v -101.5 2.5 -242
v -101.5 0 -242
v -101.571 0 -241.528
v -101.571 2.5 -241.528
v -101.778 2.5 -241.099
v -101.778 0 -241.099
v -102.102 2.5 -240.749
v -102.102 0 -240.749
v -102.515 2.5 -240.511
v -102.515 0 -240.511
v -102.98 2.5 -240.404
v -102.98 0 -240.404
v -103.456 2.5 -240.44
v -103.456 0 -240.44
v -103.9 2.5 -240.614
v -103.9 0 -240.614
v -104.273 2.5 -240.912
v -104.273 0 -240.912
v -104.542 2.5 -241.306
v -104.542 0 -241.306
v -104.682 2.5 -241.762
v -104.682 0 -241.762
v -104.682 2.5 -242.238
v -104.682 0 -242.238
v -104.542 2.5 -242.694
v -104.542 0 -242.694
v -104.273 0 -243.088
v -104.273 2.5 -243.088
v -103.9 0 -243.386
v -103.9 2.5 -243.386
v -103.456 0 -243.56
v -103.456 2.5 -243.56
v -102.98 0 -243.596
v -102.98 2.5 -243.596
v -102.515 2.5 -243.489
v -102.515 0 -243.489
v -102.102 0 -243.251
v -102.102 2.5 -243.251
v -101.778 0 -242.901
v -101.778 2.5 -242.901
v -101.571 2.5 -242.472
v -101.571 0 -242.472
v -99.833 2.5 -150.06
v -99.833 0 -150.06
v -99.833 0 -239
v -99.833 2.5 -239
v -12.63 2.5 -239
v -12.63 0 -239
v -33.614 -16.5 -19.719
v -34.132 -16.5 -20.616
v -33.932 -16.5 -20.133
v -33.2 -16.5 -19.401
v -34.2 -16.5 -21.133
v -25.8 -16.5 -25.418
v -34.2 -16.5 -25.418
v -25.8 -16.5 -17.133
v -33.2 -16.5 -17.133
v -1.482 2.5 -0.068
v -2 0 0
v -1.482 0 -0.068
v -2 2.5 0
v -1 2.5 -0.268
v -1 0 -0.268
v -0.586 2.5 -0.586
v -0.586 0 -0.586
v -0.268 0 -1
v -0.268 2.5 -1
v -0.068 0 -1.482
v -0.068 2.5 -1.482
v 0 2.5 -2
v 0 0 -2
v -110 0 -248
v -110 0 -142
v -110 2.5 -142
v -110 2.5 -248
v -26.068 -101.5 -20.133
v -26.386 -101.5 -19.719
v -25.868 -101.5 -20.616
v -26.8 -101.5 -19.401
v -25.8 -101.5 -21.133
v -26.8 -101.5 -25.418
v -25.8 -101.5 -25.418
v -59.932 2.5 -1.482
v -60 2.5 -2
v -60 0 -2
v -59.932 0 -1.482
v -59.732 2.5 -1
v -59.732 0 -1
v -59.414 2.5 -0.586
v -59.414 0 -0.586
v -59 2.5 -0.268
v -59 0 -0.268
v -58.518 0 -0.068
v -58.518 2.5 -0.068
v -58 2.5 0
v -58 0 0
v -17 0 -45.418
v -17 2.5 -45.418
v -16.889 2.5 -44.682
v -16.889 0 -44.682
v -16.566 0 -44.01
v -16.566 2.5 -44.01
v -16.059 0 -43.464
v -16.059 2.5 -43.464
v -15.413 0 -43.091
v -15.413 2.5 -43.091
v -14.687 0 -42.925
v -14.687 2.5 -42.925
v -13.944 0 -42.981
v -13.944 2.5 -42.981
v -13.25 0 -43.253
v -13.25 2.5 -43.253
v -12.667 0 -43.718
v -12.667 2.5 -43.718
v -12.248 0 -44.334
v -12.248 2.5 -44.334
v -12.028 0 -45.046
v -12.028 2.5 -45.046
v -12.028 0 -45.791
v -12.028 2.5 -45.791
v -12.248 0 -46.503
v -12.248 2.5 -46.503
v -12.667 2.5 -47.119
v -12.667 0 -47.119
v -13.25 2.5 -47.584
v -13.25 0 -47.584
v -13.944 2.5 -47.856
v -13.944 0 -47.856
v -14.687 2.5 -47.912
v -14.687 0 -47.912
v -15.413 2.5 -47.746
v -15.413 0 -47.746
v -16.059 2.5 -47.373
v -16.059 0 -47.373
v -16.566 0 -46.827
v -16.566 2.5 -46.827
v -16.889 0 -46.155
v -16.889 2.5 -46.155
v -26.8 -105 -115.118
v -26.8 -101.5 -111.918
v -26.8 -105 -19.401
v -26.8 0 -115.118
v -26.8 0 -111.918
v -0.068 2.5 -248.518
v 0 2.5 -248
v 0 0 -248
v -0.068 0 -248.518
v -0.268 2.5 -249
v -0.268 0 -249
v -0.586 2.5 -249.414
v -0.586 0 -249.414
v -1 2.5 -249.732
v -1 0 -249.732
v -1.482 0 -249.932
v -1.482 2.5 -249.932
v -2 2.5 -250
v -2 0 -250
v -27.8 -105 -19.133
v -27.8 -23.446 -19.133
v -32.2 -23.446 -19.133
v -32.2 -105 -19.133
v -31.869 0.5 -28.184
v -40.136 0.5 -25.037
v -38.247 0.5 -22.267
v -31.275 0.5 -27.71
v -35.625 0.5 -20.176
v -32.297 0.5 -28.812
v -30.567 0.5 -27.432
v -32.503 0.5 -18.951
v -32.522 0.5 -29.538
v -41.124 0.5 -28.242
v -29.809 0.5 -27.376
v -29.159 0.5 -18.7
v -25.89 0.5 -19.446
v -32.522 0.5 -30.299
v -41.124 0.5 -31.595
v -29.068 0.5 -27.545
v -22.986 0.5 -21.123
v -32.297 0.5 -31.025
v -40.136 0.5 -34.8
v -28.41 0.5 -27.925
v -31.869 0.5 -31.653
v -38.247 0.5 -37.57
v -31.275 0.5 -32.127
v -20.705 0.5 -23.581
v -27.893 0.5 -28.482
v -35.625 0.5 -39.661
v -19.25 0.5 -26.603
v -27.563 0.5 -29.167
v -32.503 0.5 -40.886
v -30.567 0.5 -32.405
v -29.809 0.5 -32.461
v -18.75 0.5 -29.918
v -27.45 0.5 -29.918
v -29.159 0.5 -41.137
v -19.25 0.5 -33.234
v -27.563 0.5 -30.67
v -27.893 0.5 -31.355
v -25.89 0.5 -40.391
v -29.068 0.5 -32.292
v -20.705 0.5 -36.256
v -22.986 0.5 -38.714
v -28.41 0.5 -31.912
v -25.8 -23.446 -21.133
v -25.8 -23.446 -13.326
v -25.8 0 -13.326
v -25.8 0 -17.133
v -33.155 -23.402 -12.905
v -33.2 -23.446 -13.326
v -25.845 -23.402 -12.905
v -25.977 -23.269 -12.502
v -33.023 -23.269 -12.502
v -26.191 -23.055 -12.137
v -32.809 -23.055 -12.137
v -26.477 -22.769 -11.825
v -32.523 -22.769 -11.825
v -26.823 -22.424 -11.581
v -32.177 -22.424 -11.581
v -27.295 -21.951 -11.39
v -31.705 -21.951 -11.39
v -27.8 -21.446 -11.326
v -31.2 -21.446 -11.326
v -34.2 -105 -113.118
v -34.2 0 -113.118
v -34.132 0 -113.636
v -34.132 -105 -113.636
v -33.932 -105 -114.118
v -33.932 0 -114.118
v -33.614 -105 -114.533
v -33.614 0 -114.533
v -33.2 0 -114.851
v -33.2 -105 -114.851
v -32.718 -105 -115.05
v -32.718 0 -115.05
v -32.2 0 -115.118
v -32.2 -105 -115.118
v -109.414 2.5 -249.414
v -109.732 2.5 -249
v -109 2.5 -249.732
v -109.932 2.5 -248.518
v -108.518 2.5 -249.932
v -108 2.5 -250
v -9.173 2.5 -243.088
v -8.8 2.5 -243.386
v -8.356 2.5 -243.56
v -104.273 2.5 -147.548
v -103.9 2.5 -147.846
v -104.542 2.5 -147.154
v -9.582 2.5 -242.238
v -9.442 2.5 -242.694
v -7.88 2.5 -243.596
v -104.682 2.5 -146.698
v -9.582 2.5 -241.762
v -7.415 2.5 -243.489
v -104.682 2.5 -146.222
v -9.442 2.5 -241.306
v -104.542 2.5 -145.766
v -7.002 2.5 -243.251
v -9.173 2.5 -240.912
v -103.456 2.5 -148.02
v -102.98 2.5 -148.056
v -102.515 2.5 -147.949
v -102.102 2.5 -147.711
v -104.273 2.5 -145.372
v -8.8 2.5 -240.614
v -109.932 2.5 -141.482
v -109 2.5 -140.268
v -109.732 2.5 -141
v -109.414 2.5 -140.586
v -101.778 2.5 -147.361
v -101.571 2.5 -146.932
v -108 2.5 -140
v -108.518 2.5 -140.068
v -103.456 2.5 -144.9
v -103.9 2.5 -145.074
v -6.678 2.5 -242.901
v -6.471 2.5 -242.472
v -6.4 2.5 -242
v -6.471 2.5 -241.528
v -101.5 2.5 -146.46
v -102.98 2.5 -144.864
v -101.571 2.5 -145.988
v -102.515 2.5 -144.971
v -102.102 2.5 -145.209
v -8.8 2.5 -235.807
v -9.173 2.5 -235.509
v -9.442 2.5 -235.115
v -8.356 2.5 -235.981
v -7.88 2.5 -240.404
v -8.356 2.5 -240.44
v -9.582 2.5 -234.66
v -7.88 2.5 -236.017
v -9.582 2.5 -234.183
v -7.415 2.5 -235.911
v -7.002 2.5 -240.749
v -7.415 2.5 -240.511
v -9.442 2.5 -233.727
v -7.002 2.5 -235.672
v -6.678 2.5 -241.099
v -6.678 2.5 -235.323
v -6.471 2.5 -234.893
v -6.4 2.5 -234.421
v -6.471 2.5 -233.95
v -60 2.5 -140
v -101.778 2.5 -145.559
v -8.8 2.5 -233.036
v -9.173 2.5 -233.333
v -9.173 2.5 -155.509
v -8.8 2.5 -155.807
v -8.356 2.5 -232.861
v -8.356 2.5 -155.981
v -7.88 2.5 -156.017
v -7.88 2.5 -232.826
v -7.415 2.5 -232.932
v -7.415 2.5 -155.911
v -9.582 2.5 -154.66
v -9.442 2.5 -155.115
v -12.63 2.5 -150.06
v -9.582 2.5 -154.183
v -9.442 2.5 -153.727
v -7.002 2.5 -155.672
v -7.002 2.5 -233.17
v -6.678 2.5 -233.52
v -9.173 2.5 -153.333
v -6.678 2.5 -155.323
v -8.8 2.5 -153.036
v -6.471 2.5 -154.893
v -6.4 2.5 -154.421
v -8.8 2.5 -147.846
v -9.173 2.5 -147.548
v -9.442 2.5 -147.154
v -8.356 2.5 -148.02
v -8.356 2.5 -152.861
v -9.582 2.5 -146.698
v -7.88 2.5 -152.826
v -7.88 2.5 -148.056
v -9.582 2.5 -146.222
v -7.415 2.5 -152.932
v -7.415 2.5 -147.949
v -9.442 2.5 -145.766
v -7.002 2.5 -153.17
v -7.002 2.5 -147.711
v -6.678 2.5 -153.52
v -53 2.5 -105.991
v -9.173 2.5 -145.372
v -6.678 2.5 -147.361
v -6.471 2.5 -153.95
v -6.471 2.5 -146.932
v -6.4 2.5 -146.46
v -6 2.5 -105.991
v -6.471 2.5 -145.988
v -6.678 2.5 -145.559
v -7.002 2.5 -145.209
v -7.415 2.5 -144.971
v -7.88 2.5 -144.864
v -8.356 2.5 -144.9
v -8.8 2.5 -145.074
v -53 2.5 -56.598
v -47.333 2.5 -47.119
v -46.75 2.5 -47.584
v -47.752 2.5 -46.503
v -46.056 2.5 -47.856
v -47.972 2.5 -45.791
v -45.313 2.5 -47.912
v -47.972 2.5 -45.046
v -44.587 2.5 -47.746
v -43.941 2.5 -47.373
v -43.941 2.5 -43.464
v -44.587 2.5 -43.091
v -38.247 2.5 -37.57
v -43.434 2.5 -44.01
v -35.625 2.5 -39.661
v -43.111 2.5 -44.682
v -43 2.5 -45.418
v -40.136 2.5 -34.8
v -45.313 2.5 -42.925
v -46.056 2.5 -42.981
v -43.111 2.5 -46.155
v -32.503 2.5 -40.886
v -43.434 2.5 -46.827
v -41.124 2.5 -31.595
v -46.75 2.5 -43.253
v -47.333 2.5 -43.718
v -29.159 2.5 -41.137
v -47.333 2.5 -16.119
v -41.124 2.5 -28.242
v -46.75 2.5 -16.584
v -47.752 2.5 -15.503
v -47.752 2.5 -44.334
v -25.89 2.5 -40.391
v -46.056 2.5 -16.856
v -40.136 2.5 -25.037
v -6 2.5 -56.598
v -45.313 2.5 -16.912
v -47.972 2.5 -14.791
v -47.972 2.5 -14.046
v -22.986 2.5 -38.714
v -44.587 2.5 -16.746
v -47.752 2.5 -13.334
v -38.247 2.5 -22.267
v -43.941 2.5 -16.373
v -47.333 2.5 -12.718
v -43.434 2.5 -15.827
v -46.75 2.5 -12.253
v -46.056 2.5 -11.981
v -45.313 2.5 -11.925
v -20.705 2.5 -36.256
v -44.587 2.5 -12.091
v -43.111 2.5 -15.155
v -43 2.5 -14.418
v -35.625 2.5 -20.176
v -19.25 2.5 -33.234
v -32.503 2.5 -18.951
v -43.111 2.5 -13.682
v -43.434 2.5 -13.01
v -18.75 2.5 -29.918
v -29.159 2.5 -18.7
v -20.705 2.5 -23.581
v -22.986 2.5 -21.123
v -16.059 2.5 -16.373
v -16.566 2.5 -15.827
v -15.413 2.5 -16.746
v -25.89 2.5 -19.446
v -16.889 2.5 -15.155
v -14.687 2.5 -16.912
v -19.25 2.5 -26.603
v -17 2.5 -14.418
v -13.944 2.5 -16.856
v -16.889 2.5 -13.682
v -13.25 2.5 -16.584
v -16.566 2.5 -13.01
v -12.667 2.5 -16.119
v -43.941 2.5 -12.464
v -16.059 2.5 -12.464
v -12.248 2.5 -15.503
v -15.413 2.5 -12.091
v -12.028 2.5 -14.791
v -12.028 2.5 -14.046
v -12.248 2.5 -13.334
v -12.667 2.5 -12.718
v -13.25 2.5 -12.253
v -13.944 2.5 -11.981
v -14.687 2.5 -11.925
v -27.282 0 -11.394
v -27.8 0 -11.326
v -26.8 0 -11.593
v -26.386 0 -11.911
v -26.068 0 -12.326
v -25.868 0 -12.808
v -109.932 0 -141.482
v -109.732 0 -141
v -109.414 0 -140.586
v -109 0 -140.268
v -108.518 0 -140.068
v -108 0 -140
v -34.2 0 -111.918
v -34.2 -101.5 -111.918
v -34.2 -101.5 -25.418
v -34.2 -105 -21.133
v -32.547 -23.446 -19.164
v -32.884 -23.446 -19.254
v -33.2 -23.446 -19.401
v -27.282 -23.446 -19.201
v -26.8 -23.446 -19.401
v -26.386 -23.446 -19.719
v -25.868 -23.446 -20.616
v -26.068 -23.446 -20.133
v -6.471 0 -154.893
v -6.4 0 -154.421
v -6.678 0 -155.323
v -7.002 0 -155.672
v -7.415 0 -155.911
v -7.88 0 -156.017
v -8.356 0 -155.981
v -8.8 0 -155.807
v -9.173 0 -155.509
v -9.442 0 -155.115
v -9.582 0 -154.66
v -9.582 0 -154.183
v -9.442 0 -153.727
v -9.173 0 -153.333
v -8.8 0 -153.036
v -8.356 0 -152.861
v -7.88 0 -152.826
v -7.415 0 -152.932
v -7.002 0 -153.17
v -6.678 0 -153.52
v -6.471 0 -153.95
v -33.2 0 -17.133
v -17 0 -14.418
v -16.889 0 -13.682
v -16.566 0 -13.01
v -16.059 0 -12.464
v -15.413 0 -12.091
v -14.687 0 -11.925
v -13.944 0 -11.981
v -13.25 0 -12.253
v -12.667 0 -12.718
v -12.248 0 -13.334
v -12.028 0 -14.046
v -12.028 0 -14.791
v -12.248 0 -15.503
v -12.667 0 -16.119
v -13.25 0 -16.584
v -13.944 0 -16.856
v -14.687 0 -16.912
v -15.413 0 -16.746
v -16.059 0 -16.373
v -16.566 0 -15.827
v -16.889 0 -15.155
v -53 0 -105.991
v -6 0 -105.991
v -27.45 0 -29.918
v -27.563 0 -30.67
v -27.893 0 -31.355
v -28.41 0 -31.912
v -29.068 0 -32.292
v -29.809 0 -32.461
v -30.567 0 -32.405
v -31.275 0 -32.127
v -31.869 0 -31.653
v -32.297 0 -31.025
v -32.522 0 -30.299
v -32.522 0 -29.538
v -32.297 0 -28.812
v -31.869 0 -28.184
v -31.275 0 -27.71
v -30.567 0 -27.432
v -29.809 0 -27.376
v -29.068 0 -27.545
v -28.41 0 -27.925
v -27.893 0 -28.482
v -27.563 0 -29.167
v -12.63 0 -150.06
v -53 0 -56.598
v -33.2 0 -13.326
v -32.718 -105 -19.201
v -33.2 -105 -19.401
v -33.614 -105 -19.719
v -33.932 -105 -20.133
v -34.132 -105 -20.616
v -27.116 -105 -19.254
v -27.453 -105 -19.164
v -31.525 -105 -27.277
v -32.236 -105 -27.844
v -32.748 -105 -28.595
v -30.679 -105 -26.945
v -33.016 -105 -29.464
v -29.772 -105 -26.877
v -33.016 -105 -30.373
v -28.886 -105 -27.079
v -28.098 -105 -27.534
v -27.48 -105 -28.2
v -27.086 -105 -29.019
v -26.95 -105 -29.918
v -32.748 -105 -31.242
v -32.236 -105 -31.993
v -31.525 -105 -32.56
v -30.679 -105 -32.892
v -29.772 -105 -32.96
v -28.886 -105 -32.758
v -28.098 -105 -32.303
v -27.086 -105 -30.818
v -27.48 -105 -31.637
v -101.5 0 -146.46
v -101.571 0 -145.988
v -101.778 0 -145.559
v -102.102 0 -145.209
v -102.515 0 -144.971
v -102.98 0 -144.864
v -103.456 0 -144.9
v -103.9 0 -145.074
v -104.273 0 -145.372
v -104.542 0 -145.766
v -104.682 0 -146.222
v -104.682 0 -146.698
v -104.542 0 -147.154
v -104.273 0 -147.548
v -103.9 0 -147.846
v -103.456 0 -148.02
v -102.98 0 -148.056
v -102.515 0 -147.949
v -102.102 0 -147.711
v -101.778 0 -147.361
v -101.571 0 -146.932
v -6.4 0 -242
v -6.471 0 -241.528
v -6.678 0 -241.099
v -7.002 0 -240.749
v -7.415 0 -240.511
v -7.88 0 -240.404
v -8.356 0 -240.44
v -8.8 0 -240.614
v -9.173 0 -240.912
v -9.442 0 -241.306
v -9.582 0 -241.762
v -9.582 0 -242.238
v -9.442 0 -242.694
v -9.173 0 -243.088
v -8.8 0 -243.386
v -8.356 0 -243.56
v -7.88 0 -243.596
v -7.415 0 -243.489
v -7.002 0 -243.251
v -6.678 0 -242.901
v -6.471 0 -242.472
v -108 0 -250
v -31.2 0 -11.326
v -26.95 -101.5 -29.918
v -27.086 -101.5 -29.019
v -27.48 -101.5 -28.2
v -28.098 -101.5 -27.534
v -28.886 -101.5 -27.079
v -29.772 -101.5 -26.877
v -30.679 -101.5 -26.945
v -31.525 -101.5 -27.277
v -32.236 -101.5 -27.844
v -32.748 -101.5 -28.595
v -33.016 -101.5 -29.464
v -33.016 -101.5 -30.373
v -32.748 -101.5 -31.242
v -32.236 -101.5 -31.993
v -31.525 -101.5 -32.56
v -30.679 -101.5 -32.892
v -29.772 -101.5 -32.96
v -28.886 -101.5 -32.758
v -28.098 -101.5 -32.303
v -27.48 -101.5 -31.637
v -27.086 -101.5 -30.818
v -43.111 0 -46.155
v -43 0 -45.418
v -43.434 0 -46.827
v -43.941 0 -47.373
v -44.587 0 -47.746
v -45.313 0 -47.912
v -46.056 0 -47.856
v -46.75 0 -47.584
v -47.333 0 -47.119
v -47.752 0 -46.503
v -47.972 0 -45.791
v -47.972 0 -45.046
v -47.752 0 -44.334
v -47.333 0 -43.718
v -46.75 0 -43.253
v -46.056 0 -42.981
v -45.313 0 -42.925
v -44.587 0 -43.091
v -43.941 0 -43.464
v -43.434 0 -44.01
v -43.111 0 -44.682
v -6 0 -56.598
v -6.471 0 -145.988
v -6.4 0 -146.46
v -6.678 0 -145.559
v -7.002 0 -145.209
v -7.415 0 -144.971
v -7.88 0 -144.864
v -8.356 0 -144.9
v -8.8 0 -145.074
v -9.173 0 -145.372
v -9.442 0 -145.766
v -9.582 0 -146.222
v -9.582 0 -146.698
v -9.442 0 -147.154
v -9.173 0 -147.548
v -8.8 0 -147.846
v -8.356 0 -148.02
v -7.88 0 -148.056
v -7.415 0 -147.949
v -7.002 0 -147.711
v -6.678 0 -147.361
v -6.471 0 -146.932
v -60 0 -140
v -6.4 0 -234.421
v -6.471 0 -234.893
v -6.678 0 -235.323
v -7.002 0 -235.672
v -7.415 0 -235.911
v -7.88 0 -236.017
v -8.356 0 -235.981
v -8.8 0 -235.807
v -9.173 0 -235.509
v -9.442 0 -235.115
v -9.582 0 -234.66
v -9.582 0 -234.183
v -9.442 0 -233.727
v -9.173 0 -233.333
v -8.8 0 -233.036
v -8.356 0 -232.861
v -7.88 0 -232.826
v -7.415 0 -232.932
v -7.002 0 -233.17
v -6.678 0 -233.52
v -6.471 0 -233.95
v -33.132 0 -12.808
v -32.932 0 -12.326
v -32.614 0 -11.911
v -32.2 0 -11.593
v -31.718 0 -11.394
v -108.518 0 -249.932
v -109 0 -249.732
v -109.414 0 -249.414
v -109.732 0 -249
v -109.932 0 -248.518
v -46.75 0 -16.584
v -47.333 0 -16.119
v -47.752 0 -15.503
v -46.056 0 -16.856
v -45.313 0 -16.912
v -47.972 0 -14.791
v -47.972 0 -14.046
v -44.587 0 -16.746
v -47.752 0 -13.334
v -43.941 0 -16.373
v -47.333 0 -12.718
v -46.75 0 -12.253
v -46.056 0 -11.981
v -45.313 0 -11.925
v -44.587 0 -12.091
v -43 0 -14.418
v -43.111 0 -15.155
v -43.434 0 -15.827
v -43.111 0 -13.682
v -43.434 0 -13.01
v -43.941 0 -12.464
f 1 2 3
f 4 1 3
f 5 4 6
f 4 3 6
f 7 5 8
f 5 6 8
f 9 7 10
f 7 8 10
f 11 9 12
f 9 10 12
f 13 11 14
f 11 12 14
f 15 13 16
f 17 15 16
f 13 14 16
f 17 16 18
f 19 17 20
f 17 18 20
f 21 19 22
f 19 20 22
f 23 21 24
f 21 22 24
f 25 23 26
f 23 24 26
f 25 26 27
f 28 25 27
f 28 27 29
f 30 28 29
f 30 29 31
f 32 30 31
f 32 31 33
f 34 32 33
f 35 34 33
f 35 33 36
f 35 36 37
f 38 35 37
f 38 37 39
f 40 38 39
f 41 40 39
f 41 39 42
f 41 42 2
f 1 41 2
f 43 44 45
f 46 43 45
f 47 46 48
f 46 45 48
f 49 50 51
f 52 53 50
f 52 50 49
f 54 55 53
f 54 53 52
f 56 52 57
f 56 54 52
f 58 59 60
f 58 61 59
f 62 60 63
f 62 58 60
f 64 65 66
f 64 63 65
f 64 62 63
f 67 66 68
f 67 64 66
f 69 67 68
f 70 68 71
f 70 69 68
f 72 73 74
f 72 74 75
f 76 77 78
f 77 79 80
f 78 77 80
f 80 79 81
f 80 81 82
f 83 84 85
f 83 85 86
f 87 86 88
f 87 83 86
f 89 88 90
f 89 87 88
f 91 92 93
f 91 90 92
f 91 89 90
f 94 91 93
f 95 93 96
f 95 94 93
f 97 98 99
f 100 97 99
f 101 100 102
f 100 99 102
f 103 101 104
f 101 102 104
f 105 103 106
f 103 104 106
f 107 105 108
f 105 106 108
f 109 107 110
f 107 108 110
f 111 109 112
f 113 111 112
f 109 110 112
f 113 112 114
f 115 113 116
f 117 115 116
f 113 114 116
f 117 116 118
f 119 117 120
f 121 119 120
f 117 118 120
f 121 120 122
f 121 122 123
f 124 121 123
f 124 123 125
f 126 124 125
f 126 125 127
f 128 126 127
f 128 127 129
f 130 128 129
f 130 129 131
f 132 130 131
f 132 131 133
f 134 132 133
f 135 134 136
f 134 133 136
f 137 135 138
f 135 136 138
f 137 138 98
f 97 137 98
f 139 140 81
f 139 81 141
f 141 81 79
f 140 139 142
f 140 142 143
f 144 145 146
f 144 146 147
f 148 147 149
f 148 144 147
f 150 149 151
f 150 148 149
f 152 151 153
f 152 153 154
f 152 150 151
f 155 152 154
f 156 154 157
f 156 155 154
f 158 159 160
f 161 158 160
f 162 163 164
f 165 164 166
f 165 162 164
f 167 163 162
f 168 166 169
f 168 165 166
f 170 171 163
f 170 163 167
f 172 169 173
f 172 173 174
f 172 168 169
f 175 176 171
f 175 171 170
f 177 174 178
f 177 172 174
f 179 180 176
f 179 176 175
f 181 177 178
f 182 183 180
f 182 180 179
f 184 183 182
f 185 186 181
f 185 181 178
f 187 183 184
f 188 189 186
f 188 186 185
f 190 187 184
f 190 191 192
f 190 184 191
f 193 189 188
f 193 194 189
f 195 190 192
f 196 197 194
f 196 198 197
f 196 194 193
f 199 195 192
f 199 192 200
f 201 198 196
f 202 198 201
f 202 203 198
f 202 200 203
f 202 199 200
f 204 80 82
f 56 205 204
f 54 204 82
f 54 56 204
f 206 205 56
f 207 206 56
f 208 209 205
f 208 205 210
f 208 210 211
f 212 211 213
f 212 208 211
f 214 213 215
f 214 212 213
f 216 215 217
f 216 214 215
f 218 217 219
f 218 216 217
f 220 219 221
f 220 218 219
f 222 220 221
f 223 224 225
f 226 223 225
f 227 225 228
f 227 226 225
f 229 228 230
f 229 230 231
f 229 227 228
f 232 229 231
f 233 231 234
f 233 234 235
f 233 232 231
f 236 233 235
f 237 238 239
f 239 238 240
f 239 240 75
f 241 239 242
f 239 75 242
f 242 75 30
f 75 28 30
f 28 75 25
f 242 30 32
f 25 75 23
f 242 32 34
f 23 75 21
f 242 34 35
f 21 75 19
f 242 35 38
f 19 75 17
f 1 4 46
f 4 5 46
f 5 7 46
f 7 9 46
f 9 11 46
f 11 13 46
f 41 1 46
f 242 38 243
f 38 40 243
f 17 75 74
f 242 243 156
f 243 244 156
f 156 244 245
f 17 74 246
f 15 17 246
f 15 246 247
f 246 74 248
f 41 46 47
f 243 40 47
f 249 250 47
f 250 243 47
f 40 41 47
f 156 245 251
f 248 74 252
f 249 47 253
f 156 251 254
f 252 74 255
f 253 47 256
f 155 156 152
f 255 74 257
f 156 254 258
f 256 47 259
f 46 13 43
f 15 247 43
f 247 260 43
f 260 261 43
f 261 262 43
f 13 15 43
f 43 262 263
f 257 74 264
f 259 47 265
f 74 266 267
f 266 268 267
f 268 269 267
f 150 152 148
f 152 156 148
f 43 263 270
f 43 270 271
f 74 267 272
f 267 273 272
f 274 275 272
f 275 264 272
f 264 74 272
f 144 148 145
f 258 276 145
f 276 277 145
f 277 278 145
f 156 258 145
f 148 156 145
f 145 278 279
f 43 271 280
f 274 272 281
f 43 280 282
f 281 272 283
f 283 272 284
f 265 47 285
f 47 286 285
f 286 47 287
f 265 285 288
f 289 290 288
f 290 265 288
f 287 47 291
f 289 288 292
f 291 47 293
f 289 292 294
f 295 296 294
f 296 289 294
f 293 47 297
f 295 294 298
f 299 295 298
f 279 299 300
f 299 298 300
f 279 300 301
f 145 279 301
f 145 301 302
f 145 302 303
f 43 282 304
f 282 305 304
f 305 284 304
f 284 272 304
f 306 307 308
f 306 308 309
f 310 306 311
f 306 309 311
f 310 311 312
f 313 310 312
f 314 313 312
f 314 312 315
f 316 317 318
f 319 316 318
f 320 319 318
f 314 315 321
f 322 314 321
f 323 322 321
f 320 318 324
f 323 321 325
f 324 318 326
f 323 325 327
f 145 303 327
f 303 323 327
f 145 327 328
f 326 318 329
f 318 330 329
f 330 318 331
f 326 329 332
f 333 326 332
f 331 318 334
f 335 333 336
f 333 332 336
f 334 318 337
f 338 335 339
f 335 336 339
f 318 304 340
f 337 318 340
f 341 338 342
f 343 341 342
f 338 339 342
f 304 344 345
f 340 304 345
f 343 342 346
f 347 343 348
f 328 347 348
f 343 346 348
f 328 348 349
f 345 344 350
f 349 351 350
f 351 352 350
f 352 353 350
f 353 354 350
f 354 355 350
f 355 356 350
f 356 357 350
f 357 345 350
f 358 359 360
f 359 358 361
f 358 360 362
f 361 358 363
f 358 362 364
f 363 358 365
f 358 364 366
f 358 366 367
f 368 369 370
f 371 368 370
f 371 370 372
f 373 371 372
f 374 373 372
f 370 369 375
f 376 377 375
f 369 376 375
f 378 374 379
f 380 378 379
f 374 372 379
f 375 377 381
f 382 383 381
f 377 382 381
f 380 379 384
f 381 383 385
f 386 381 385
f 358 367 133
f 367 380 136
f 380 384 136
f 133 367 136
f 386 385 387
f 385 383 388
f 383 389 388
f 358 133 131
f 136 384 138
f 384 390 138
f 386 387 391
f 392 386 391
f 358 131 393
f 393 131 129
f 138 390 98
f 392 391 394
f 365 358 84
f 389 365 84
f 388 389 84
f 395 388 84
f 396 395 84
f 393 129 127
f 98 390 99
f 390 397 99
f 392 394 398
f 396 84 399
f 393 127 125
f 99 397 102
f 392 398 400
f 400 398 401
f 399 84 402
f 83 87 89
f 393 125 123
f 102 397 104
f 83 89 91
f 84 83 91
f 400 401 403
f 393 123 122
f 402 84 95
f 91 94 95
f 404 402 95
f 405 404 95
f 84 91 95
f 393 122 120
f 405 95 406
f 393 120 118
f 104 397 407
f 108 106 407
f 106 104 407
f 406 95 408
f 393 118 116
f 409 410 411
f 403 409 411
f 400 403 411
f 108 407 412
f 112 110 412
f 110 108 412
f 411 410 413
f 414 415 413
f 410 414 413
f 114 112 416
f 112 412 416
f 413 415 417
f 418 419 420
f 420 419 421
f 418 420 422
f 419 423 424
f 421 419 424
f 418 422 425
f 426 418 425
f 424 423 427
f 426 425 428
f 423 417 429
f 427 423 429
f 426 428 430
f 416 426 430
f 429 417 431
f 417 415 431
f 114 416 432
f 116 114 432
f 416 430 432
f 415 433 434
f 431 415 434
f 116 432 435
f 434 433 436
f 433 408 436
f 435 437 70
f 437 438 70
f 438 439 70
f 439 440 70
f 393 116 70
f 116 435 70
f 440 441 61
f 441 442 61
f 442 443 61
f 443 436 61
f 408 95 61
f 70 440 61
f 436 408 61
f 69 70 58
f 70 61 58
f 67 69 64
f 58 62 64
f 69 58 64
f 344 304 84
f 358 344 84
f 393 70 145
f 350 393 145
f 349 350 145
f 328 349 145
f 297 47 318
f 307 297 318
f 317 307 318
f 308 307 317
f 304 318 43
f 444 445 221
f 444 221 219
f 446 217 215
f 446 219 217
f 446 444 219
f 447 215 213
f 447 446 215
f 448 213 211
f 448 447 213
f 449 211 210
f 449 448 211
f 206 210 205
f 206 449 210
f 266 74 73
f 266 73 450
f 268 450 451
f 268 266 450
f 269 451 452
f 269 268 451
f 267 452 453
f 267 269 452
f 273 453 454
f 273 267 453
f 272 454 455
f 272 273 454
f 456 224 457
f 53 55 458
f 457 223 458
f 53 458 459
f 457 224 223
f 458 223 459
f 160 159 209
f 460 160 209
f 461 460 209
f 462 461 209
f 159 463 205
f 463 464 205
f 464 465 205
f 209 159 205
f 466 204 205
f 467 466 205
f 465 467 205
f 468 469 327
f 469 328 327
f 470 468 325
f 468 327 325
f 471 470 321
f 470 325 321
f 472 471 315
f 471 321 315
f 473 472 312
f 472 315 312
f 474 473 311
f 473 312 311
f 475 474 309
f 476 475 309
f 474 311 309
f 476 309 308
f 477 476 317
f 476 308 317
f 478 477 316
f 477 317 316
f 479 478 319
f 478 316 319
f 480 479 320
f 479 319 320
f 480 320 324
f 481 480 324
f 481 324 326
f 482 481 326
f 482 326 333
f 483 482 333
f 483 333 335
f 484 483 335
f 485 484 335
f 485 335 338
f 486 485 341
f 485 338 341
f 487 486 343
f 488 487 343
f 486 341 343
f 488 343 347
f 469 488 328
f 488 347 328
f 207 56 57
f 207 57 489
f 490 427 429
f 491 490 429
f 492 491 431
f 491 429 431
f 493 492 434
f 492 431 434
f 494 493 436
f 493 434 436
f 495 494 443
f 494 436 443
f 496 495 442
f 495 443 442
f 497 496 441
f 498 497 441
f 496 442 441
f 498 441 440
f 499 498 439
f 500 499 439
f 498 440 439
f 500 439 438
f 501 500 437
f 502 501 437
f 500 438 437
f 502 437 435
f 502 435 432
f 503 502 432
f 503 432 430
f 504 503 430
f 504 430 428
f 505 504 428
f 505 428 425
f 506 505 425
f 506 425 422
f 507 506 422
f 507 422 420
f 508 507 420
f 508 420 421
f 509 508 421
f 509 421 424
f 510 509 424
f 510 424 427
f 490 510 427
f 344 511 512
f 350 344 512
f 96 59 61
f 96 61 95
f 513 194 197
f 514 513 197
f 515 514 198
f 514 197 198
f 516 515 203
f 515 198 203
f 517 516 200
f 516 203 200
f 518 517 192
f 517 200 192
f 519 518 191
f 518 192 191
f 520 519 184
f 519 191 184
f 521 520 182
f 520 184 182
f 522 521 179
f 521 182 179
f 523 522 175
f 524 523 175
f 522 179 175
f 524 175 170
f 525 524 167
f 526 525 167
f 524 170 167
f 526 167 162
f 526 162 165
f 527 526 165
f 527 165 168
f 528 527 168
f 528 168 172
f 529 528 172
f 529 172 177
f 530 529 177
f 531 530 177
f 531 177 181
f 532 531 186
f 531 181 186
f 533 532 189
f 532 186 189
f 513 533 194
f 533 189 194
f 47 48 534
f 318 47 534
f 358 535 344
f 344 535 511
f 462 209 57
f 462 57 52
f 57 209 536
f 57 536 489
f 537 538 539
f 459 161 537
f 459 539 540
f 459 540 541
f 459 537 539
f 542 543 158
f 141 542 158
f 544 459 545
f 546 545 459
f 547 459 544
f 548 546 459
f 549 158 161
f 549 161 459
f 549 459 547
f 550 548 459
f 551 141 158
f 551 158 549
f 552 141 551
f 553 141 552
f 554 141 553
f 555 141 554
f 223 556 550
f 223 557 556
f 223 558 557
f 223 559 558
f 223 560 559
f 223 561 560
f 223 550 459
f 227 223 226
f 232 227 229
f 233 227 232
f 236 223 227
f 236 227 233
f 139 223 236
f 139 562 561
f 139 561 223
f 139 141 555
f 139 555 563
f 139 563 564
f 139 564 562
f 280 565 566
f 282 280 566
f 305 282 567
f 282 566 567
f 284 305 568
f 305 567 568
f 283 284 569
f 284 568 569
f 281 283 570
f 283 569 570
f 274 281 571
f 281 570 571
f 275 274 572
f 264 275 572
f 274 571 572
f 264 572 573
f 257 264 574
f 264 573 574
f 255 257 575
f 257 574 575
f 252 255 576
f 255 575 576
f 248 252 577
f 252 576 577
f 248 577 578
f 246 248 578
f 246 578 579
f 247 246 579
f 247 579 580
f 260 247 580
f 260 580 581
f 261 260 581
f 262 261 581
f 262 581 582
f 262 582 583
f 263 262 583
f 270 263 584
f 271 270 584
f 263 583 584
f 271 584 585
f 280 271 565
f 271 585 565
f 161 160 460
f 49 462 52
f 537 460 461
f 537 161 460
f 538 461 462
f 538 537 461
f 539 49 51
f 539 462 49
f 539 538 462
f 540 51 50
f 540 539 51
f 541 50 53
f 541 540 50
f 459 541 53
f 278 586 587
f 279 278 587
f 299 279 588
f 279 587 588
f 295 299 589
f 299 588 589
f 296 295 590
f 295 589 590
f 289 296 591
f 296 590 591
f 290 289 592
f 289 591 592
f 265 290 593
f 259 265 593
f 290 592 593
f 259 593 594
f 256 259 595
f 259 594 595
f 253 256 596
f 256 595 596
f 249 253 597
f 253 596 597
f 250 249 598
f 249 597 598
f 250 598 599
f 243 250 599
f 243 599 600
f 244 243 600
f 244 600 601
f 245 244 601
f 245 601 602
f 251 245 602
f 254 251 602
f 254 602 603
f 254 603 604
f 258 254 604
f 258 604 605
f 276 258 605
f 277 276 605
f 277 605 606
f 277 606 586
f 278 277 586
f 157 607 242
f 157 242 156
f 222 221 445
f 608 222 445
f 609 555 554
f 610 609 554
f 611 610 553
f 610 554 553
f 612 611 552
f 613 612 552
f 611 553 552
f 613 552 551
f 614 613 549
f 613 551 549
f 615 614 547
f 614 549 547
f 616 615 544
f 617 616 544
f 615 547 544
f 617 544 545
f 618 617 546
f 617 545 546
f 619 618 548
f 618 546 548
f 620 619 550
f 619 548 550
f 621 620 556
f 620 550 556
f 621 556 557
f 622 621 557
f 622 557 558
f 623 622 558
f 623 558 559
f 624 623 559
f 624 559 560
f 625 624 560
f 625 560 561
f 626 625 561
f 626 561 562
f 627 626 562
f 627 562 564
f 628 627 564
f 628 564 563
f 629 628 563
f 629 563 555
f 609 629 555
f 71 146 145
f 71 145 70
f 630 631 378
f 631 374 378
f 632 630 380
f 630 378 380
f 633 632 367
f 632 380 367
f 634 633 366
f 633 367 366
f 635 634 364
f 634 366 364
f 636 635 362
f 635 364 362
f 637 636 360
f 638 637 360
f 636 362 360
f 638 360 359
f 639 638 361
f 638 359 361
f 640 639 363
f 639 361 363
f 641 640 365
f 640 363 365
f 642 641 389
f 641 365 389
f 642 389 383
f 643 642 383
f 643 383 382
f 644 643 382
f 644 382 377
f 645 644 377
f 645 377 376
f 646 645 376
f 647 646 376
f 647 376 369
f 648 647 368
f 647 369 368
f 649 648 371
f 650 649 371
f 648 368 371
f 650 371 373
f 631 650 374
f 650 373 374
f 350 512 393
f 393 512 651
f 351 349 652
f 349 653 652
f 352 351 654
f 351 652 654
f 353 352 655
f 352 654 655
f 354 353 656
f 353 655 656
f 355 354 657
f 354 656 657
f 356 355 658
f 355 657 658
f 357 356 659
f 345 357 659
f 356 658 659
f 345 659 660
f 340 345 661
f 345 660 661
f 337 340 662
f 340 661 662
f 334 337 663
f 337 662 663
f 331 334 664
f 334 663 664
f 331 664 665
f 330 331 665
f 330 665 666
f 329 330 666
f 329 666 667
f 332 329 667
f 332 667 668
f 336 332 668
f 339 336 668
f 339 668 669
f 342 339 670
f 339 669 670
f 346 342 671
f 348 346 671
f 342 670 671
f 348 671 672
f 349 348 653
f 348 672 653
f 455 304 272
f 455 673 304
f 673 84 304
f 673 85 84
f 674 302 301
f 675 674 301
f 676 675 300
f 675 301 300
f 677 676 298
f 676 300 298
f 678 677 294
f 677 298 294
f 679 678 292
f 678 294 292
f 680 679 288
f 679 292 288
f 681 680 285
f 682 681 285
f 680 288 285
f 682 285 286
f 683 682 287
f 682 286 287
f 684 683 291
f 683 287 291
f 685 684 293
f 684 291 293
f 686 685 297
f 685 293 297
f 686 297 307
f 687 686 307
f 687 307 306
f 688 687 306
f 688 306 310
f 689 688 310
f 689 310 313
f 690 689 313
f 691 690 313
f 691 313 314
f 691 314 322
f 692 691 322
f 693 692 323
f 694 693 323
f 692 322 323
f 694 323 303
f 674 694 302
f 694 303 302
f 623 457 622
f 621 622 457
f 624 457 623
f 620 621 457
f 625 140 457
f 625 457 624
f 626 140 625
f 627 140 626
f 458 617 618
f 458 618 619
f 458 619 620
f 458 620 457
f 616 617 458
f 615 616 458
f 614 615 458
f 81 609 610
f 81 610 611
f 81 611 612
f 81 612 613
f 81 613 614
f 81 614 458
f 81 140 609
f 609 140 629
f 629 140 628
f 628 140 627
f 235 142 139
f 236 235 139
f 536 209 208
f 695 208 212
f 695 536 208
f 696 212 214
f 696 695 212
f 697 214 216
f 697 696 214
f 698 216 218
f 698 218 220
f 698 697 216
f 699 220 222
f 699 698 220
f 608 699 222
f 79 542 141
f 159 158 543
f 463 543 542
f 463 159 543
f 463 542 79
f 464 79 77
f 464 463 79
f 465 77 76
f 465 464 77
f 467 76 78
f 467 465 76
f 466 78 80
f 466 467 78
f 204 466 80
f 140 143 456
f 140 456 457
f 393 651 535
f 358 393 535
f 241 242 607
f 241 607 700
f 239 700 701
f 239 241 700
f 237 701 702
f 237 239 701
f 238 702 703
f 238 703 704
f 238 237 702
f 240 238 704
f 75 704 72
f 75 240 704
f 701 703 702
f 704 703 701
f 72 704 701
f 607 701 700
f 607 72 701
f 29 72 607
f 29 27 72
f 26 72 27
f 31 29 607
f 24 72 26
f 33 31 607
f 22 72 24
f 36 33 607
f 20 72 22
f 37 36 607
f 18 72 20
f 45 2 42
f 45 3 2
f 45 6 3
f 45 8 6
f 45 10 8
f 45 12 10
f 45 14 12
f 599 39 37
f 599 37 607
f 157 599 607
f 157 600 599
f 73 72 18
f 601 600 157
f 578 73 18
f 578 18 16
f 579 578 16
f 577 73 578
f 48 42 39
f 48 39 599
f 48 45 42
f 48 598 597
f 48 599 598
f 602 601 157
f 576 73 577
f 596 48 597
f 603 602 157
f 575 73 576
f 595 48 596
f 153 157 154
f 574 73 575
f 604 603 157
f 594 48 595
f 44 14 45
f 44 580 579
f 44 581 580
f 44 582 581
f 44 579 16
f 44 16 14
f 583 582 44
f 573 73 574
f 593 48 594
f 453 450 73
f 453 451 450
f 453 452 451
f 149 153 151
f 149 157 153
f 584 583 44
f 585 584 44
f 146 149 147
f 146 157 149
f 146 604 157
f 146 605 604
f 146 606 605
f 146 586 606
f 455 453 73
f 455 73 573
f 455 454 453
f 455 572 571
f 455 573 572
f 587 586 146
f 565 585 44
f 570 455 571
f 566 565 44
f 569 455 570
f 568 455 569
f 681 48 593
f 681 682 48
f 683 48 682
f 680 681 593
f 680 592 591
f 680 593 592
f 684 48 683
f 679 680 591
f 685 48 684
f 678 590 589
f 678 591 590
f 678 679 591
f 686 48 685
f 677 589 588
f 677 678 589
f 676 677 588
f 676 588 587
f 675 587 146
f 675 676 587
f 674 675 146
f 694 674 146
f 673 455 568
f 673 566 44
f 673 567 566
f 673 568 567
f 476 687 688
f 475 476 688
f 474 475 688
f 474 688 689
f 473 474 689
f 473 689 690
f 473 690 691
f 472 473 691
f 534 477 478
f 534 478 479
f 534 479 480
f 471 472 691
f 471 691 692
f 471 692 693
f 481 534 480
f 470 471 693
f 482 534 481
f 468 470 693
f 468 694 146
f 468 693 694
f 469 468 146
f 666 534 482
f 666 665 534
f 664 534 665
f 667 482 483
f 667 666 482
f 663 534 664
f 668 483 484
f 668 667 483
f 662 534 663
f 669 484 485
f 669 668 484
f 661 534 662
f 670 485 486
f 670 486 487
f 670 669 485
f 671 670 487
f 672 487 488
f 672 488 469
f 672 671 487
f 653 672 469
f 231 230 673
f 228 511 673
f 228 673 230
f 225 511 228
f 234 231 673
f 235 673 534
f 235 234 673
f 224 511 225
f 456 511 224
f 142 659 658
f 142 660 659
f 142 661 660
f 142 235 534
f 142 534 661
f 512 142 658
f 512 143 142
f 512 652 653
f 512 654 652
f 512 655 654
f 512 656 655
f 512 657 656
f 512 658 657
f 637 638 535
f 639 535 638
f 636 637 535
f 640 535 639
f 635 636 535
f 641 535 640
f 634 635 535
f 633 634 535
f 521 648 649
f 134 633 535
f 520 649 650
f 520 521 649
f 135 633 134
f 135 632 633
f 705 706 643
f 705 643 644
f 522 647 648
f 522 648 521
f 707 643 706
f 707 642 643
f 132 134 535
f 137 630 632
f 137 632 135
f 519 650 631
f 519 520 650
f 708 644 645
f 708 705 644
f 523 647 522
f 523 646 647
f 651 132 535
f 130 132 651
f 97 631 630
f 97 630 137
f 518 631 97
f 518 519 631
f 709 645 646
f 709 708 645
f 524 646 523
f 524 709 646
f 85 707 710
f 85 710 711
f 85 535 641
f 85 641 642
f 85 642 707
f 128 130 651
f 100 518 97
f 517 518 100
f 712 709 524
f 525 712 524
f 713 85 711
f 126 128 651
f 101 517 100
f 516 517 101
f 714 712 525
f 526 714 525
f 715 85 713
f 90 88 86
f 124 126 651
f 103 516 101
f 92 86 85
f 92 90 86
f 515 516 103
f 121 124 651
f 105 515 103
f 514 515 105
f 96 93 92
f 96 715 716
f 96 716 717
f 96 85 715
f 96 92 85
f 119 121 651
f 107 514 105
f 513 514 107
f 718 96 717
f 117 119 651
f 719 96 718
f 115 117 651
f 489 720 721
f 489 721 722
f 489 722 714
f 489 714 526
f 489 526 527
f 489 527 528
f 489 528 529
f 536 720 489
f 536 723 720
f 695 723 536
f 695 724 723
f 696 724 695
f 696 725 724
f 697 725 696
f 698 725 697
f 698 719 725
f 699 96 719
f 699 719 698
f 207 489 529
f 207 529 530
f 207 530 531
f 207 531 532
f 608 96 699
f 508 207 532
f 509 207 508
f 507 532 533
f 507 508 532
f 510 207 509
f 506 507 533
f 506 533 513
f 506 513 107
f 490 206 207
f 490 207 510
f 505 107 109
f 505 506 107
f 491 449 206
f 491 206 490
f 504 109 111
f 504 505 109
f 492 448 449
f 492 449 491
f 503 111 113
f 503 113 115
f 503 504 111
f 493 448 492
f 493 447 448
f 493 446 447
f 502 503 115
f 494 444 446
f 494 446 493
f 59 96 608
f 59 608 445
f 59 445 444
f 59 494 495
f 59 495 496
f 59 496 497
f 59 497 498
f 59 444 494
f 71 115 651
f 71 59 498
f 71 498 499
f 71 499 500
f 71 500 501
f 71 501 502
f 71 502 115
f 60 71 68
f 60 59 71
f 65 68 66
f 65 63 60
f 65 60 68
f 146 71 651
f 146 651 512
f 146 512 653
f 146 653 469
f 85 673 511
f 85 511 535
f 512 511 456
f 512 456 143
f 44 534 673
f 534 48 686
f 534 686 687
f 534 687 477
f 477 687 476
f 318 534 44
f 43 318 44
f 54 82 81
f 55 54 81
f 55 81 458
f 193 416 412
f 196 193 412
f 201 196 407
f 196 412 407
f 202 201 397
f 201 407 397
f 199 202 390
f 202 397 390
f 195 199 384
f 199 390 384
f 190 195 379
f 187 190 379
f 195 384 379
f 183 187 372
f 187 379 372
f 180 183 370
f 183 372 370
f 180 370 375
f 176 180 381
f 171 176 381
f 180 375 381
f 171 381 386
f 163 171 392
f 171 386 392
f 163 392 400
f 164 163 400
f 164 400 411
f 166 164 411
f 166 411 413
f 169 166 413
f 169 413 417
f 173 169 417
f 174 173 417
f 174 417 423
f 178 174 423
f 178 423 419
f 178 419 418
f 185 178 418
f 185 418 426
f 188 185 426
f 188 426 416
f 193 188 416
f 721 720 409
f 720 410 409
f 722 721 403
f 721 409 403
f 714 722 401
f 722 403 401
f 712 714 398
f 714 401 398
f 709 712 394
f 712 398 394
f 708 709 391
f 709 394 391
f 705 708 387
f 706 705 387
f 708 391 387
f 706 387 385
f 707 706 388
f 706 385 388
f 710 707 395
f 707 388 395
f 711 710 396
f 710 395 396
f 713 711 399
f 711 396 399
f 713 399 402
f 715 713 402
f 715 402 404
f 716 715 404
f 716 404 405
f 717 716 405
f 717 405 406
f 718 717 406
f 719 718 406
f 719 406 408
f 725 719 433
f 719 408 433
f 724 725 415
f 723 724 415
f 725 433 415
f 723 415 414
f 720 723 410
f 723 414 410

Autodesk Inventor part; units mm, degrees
ref_plane "YZ Plane" through (0, 0, 0) normal (1, 0, 0) x (0, 1, 0)
ref_plane "XZ Plane" through (0, 0, 0) normal (0, 1, 0) x (-1, 0, 0)
ref_plane "XY Plane" through (0, 0, 0) normal (0, 0, 1) x (1, 0, 0)
sketch "草图1" plane through (0, 0, 0) normal (0, 1, 0) x (-1, 0, 0)
  line L0 (0, 0) -> (60, 0)
  line L1 (60, 0) -> (60, -140)
  line L2 (60, -140) -> (0, -140)
  line L3 (0, -140) -> (0, 0)
  dimension "d0" = 60
  dimension "d1" = 140
extrude "拉伸1" add sketch "草图1" along normal blind 2.5
sketch "草图2" plane through (0, 2.5, 0) normal (0, 1, 0) x (1, 0, 0)
  line L0 (0, 140) -> (-60, 140) projected
  line L1 (-60, 140) -> (-60, 0) projected
  line L2 (-60, 0) -> (0, 0) projected
  line L3 (0, 0) -> (0, 140) projected
  line L4 (-60, 0) -> (0, 0) projected
  line L5 (-30, 0) -> (-30, 146.6003)
  line L6 (-30, 8.9185) -> (-51, 8.9185)
  line L7 (-51, 8.9185) -> (-51, 50.9185)
  line L8 (-51, 50.9185) -> (-30, 50.9185)
  line L9 (-30, 50.9185) -> (-30, 8.9185)
  line L10 (-30, 8.9185) -> (-9, 8.9185)
  line L11 (-9, 8.9185) -> (-9, 50.9185)
  line L12 (-9, 50.9185) -> (-30, 50.9185)
  circle A0 centre (-45.5, 14.4185) radius 2.9433
  line L13 (-51, 29.9185) -> (-35.5931, 29.9185)
  circle A1 centre (-45.5, 45.4185) radius 2.9433
  circle A2 centre (-14.5, 14.4185) radius 2.9433
  circle A3 centre (-14.5, 45.4185) radius 2.9433
  circle A4 centre (-30, 29.9185) radius 2.55
  circle A5 centre (-30, 29.9185) radius 11.25
  dimension "d4" = 21
  dimension "d5" = 42
  dimension "d6" = 31
  dimension "d7" = 31
  dimension "d12" = 5.1
  dimension "d15" = 22.5
extrude "拉伸4" cut sketch "草图2" along normal mid plane 10 contours A4 L5 | L5 A4
extrude "拉伸5" cut sketch "草图2" against normal blind 10 contours A5 L5 A4 | L5 A4 A5 | A4 L5 | L5 A4
extrude "拉伸6" cut sketch "草图2" against normal blind 10 contours A5 L5 A4 | L5 A4 A5 | A4 L5 | L5 A4
sketch "草图6" plane through (0, 0, 0) normal (0, -1, 0) x (1, 0, 0)
  line L0 (-9, -8.9185) -> (-51, -8.9185) projected
  circle A0 centre (-30, -29.9185) radius 2.55 projected
  line L1 (-30, -29.9185) -> (-26.8, -29.9185)
  line L2 (-26.8, -29.9185) -> (-26.8, -111.9185)
  line L3 (-30, -29.9185) -> (-30, -39.9264)
  line L4 (-30, -29.9185) -> (-33.2, -29.9185)
  line L5 (-33.2, -29.9185) -> (-33.2, -111.9185)
  line L6 (-26.8, -111.9185) -> (-31.6, -111.9185)
  line L7 (-31.6, -111.9185) -> (-33.2, -111.9185)
  line L8 (-26.8, -111.9185) -> (-33.2, -111.9185)
  line L9 (-33.2, -111.9185) -> (-33.2, -115.1185)
  line L10 (-33.2, -115.1185) -> (-26.8, -115.1185)
  line L11 (-26.8, -115.1185) -> (-26.8, -111.9185)
  point P0 (0, 0)
  dimension "d20" = 3.2
  dimension "d21" = 82
  dimension "d22" = 3.2
extrude "拉伸7" add sketch "草图6" along normal blind 105 contours L11 L10 L9 L7 L6
sketch "草图7" plane through (-33.2, 0, -111.9185) normal (0, 0, 1) x (1, 0, 0)
  line L0 (0, 0) -> (6.4, 0) projected
  line L1 (0, 0) -> (0, -105) projected
  line L2 (6.4, -105) -> (0, -105) projected
  line L3 (6.4, 0) -> (6.4, -105) projected
  line L4 (6.4, 0) -> (6.4, -105) projected
  line L5 (0, 0) -> (0, -105) projected
  line L6 (6.4, -105) -> (0, -105)
  line L7 (0, -105) -> (0, -101.5)
  line L8 (0, -101.5) -> (6.4, -101.5)
  line L9 (6.4, -101.5) -> (6.4, -105)
  point P0 (33.2, 0)
  dimension "d25" = 3.5
sketch "草图8" plane through (0, -105, 0) normal (0, -1, 0) x (1, 0, 0)
  line L0 (-26.8, -111.9185) -> (-26.8, -115.1185) projected
  line L1 (-26.8, -115.1185) -> (-33.2, -115.1185) projected
  line L2 (-33.2, -115.1185) -> (-33.2, -111.9185) projected
  line L3 (-33.2, -111.9185) -> (-26.8, -111.9185) projected
  circle A0 centre (-30, -29.9185) radius 11.25 projected
  line L4 (0, -140) -> (-60, -140) projected
  line L5 (0, 0) -> (0, -140) projected
  line L6 (-60, 0) -> (0, 0) projected
  line L7 (-60, -140) -> (-60, 0) projected
  line L8 (-26.8, -111.9185) -> (-26.8, -29.9185)
  line L9 (-26.8, -29.9185) -> (-33.2, -29.9185)
  line L10 (-33.2, -29.9185) -> (-33.2, -111.9185)
  line L11 (-33.2, -111.9185) -> (-26.8, -111.9185)
  line L12 (-26.8, -111.9185) -> (-26.8, -29.9185)
  circle A1 centre (-30, -29.9185) radius 3.2
  line L13 (-26.8, -29.9185) -> (-26.8, -14.9185)
  line L14 (-26.8, -14.9185) -> (-33.2, -14.9185)
  line L15 (-33.2, -14.9185) -> (-33.2, -29.9185)
  circle A2 centre (-30, -29.9185) radius 2.55 projected
  line L16 (-26.8, -14.9185) -> (-26.8, -25.4185)
  line L17 (-26.8, -25.4185) -> (-33.2, -25.4185)
  dimension "d26" = 15
  dimension "d40" = 10.5
extrude "拉伸8" add sketch "草图8" against normal blind 3.5 contours L3 L10 A0 L8 | A0 L10 A1 L8 | A1 L9 A2 | L9 A2 A1 | A1 L15 L17 L13 | L15 L14 L13 A0 | A0 L13 L17 L15
sketch "草图10" plane through (0, -105, 0) normal (0, -1, 0) x (1, 0, 0)
  line L0 (-26.8, -111.9185) -> (-26.8, -115.1185) projected
  line L1 (-26.8, -115.1185) -> (-33.2, -115.1185) projected
  line L2 (-33.2, -115.1185) -> (-33.2, -111.9185) projected
  line L3 (-33.2, -111.9185) -> (-26.8, -111.9185) projected
  circle A0 centre (-30, -29.9185) radius 11.25 projected
  line L4 (0, -140) -> (-60, -140) projected
  line L5 (0, 0) -> (0, -140) projected
  line L6 (-60, 0) -> (0, 0) projected
  line L7 (-60, -140) -> (-60, 0) projected
  circle A1 centre (-30, -29.9185) radius 2.55 projected
  line L8 (-33.2, -14.9185) -> (-33.2, -115.1185) projected
  line L9 (-33.2, -115.1185) -> (-26.8, -115.1185) projected
  line L10 (-26.8, -115.1185) -> (-26.8, -14.9185) projected
  line L11 (-26.8, -14.9185) -> (-33.2, -14.9185) projected
  circle A2 centre (-30, -29.9185) radius 3.05
  point P0 (-33.2, -19.1332)
  point P1 (-26.8, -19.1332)
  dimension "d31" = 6.1
extrude "拉伸9" add sketch "草图10" against normal up to surface (105 mm away) contours A0 L8 L11 L10
extrude "拉伸10" cut sketch "草图10" against normal up to surface (3.5 mm away) contours A2
sketch "草图11" plane through (-33.2, -105, -115.1185) normal (-1, 0, 0) x (0, 0, 1)
  line L0 (3.2, 3.5) -> (95.9853, 3.5) projected
  line L1 (3.2, 105) -> (3.2, 3.5) projected
  line L2 (0, 105) -> (3.2, 105) projected
  line L3 (0, 105) -> (0, 0) projected
  line L4 (100.2, 0) -> (0, 0) projected
  line L5 (100.2, 0) -> (100.2, 105) projected
  line L6 (95.9853, 105) -> (100.2, 105) projected
  line L7 (95.9853, 3.5) -> (95.9853, 105) projected
  point P0 (115.1185, 105)
extrude "拉伸11" add sketch "草图11" along normal blind 1
sketch "草图12" plane through (0, 0, 0) normal (0, -1, 0) x (1, 0, 0)
  point P0 (0, 0)
extrude "拉伸12" add sketch "草图2" against normal up to surface (2.5 mm away) contours A5 L5 A4 | L5 A4 A5
sketch "草图13" plane through (-30, 2.5, -29.9185) normal (0, 1, 0) x (1, 0, 0)
  point P0 (30, -29.9185)
extrude "拉伸13" cut sketch "草图2" against normal blind 2 contours A5 L5 A4 | L5 A4 A5
sketch "草图14" plane through (0, -105, 0) normal (0, -1, 0) x (1, 0, 0)
  circle A0 centre (-30, -29.9185) radius 3.05 projected
  line L0 (-26.8, -115.1185) -> (-34.2, -115.1185) projected
  line L1 (-26.8, -14.9185) -> (-34.2, -14.9185) projected
  line L2 (-34.2, -115.1185) -> (-34.2, -14.9185) projected
  line L3 (-34.2, -115.1185) -> (-34.2, -14.9185) projected
  line L4 (-34.2, -19.1332) -> (-34.2, -14.9185) projected
  line L5 (-34.2, -19.1332) -> (-34.2, -111.9185) projected
  line L6 (-34.2, -115.1185) -> (-34.2, -111.9185) projected
  line L7 (-33.2, -19.1332) -> (-34.2, -19.1332) projected
  line L8 (-34.2, -19.1332) -> (-25.8, -19.1332)
  line L9 (-25.8, -115.1185) -> (-25.8, -14.9185) projected
  line L10 (-26.8, -115.1185) -> (-26.8, -14.9185) projected
  point P0 (0, 0)
  point P1 (-26.8, -19.1332)
extrude "拉伸14" cut sketch "草图14" against normal up to surface (105 mm away) contours L8 L7 L2 L1 L10
sketch "草图15" plane through (0, -101.5, 0) normal (0, 1, 0) x (1, 0, 0)
  line L0 (-34.2, 111.9185) -> (-26.8, 111.9185) projected
  line L1 (-34.2, 19.1332) -> (-34.2, 111.9185) projected
  circle A0 centre (-30, 29.9185) radius 3.05 projected
  line L2 (-26.8, 25.4185) -> (-33.2, 25.4185) projected
  line L3 (-26.8, 14.9185) -> (-26.8, 25.4185) projected
  line L4 (-34.2, 19.1332) -> (-26.8, 19.1332) projected
  line L5 (-26.8, 19.1332) -> (-26.8, 111.9185) projected
  point P0 (0, 0)
sketch "草图16" plane through (0, -105, 0) normal (0, -1, 0) x (1, 0, 0)
  line L0 (-26.8, -25.4185) -> (-33.2, -25.4185) projected
  line L1 (-34.2, -115.1185) -> (-34.2, -19.1332) projected
  line L2 (-26.8, -115.1185) -> (-34.2, -115.1185) projected
  circle A0 centre (-30, -29.9185) radius 3.05 projected
  line L3 (-26.8, -19.1332) -> (-34.2, -19.1332) projected
  line L4 (-26.8, -115.1185) -> (-26.8, -19.1332) projected
  point P0 (0, 0)
sketch "草图17" plane through (0, -101.5, 0) normal (0, 1, 0) x (1, 0, 0)
  line L0 (-25.8, 19.1332) -> (-34.2, 19.1332) projected
  line L1 (-25.8, 19.1332) -> (-25.8, 111.9185) projected
  line L2 (-34.2, 19.1332) -> (-25.8, 19.1332)
  line L3 (-25.8, 19.1332) -> (-25.8, 25.4182)
  line L4 (-25.8, 25.4182) -> (-34.2, 25.4182)
  line L5 (-34.2, 25.4182) -> (-34.2, 19.1332)
  point P0 (0, 0)
  dimension "d43" = 6.285
extrude "拉伸15" add sketch "草图17" along normal up to surface (101.5 mm away)
fillet "圆角1" radius 2 3 edges at (-34.2, -52.5, -19.1332) (-25.8, -50.75, -19.1332) (-34.2, -52.5, -115.1185)
sketch "草图18" plane through (0, 2.5, 0) normal (0, 1, 0) x (1, 0, 0)
  circle A0 centre (-30, 29.9185) radius 11.25 projected
  line L0 (0, 140) -> (-60, 140) projected
  line L1 (-60, 140) -> (-60, 0) projected
  line L2 (-60, 0) -> (0, 0) projected
  line L3 (0, 0) -> (0, 140) projected
  circle A1 centre (-45.5, 14.4185) radius 2.5
  line L4 (-30, 29.9185) -> (-30, 12.6275)
  circle A2 centre (-45.5, 45.4185) radius 2.5
  point P0 (-14.5, 14.4185)
  dimension "d47" = 5
  dimension "d48" = 5
extrude "拉伸16" cut sketch "草图18" against normal blind 10 contours A1 | A2
ref_plane "工作平面2" through (-30, 0, -140) normal (-1, 0, 0) x (0, 0, 1)
mirror "镜像2" about plane through (-30, 0, -140) normal (-1, 0, 0) of "拉伸16"
sketch "草图19" plane through (0, 0, 0) normal (0, -1, 0) x (1, 0, 0)
  line L0 (0, -140) -> (-60, -140) projected
  line L1 (0, -140) -> (-110, -140)
  line L2 (-110, -140) -> (-110, -250)
  line L3 (-110, -250) -> (0, -250)
  line L4 (0, -250) -> (0, -140)
  circle A0 centre (-8, -146.46) radius 1.6
  circle A1 centre (-8, -242) radius 1.6
  circle A2 centre (-103.1, -146.46) radius 1.6
  circle A3 centre (-103.1, -242) radius 1.6
  point P0 (0, 0)
  dimension "d51" = 110
  dimension "d52" = 110
  dimension "d53" = 3.2
  dimension "d54" = 3.2
  dimension "d55" = 95.54
  dimension "d56" = 8
  dimension "d57" = 3.2
  dimension "d58" = 95.1
  dimension "d59" = 3.2
  dimension "d74" = 8
  dimension "d75" = 8
  dimension "d76" = 95.1
extrude "拉伸17" add sketch "草图19" against normal up to surface (2.5 mm away)
sketch "草图20" plane through (-25.8, -101.5, -25.4182) normal (1, 0, 0) x (0, 0, -1)
  line L0 (-4.285, 0) -> (-4.285, 101.5) projected
  line L1 (-4.285, 0) -> (0, 0) projected
  line L2 (0, 0) -> (0, 101.5) projected
  line L3 (-4.285, 101.5) -> (0, 101.5) projected
  line L4 (-4.285, 0) -> (-4.285, 101.5) projected
  line L5 (-4.285, 101.5) -> (-4.285, 85)
  line L6 (-4.285, 85) -> (0, 85)
  line L7 (0, 0) -> (0, 101.5) projected
  line L8 (-4.285, 85) -> (-8.285, 85)
  line L9 (-8.285, 85) -> (-8.285, 101.5)
  line L10 (114.5818, 101.5) -> (-25.4182, 101.5) projected
  line L11 (-6.285, 78.0536) -> (-14.0927, 78.0536)
  line L12 (-14.0927, 78.0536) -> (-14.0927, 101.5)
  line L13 (-6.285, 101.5) -> (-6.285, -3.5) projected
  point P0 (-6.285, 85)
  dimension "d62" = 16.5
  dimension "d63" = 4
extrude "拉伸18" cut sketch "草图20" along normal mid plane 20.75 contours L8 L13 L10 L0 | L0 L3 L2 L6 | L8 L9 L10 L13
extrude "拉伸19" add sketch "草图20" against normal blind 7.4 contours L13 L11 L12 L10 L9 L8
sketch "草图21" plane through (-25.8, -23.4464, -19.1332) normal (0, 0, -1) x (-1, 0, 0)
  line L0 (2, 6.9464) -> (2, 0) projected
  line L1 (0, 6.9464) -> (2, 6.9464) projected
  line L2 (0, 0) -> (0, 6.9464) projected
  line L3 (0, 0) -> (2, 0) projected
  line L4 (6.4, 0) -> (6.4, 6.9464) projected
  line L5 (6.4, 0) -> (7.4, 0) projected
  line L6 (7.4, 6.9464) -> (7.4, 0) projected
  line L7 (6.4, 6.9464) -> (7.4, 6.9464) projected
  point P0 (-25.8, 23.4464)
extrude "拉伸20" add sketch "草图21" along normal blind 2.5
fillet "圆角2" radius 2 3 edges at (-29.5, -23.4464, -11.3254) (-25.8, -11.7232, -11.3254) (-33.2, -11.7232, -11.3254)
sketch "草图22" plane through (0, -105, 0) normal (0, -1, 0) x (1, 0, 0)
  circle A0 centre (-30, -29.9185) radius 3.05 projected
  circle A1 centre (-30, -29.9185) radius 3.2 projected
  point P0 (0, 0)
sketch "草图23" plane through (0, -105, 0) normal (0, -1, 0) x (1, 0, 0)
  circle A0 centre (-30, -29.9185) radius 2.55 projected
  point P0 (0, 0)
sketch "草图24" plane through (0, -105, 0) normal (0, -1, 0) x (1, 0, 0)
  point P0 (0, 0)
sketch "草图25" plane through (0, -105, 0) normal (0, -1, 0) x (1, 0, 0)
  circle A0 centre (-30, -29.9185) radius 2.75
  point P0 (0, 0)
  dimension "d71" = 5.5
extrude "拉伸21" cut sketch "草图25" against normal blind 2.5
sketch "草图26" plane through (0, 0, 0) normal (1, 0, 0) x (0, 0, -1)
  point P0 (0, 0)
sketch "草图27" plane through (0, 2.5, 0) normal (0, 1, 0) x (1, 0, 0)
  circle A0 centre (-8, 146.46) radius 1.6 projected
  circle A1 centre (-8, 242) radius 1.6 projected
  circle A2 centre (-103.1, 146.46) radius 1.6 projected
  circle A3 centre (-103.1, 242) radius 1.6 projected
  circle A4 centre (-14.5, 14.4185) radius 2.5 projected
  circle A5 centre (-14.5, 45.4185) radius 2.5 projected
  circle A6 centre (-45.5, 14.4185) radius 2.5 projected
  circle A7 centre (-45.5, 45.4185) radius 2.5 projected
  circle A8 centre (-30, 29.9185) radius 11.25 projected
  line L0 (-60, 140) -> (-60, 0) projected
  line L1 (-60, 0) -> (0, 0) projected
  line L2 (0, 0) -> (0, 250) projected
  line L3 (-110, 250) -> (0, 250) projected
  line L4 (-110, 140) -> (-110, 250) projected
  line L5 (-60, 140) -> (-110, 140) projected
  circle A9 centre (-8, 154.4212) radius 1.6
  circle A10 centre (-8, 234.4212) radius 1.6
  dimension "d77" = 3.2
  dimension "d78" = 3.2
  dimension "d79" = 80
extrude "拉伸22" cut sketch "草图27" against normal up to surface (2.5 mm away) contours A9 | A10
sketch "草图28" plane through (0, 0, 0) normal (0, -1, 0) x (1, 0, 0)
  line L0 (-12.63, -150.06) -> (-99.8327, -150.06)
  line L1 (-99.8327, -150.06) -> (-99.8327, -239)
  line L2 (-99.8327, -239) -> (-12.63, -239)
  line L3 (-12.63, -239) -> (-12.63, -150.06)
  circle A0 centre (-8, -146.46) radius 1.6 projected
  circle A1 centre (-8, -242) radius 1.6 projected
  point P0 (0, 0)
  dimension "d82" = 3.6
  dimension "d83" = 3
extrude "拉伸23" cut sketch "草图28" against normal blind 10 contours L3 L2 L1 L0
fillet "圆角3" radius 2 5 edges at (-110, 1.25, -250) (0, 1.25, -250) (-110, 1.25, -140) (-60, 1.25, 0) (0, 1.25, 0)
sketch "草图29" plane through (0, 0, 0) normal (0, -1, 0) x (1, 0, 0)
  line L0 (-6, -56.5984) -> (-53, -56.5984)
  line L1 (-53, -56.5984) -> (-53, -105.9913)
  line L2 (-53, -105.9913) -> (-6, -105.9913)
  line L3 (-6, -105.9913) -> (-6, -56.5984)
  line L4 (-60, -140) -> (-60, -2) projected
  line L5 (0, -2) -> (0, -248) projected
  point P0 (0, 0)
  dimension "d87" = 7
  dimension "d88" = 6
extrude "拉伸24" cut sketch "草图29" against normal blind 10
properties part number "42底座"
